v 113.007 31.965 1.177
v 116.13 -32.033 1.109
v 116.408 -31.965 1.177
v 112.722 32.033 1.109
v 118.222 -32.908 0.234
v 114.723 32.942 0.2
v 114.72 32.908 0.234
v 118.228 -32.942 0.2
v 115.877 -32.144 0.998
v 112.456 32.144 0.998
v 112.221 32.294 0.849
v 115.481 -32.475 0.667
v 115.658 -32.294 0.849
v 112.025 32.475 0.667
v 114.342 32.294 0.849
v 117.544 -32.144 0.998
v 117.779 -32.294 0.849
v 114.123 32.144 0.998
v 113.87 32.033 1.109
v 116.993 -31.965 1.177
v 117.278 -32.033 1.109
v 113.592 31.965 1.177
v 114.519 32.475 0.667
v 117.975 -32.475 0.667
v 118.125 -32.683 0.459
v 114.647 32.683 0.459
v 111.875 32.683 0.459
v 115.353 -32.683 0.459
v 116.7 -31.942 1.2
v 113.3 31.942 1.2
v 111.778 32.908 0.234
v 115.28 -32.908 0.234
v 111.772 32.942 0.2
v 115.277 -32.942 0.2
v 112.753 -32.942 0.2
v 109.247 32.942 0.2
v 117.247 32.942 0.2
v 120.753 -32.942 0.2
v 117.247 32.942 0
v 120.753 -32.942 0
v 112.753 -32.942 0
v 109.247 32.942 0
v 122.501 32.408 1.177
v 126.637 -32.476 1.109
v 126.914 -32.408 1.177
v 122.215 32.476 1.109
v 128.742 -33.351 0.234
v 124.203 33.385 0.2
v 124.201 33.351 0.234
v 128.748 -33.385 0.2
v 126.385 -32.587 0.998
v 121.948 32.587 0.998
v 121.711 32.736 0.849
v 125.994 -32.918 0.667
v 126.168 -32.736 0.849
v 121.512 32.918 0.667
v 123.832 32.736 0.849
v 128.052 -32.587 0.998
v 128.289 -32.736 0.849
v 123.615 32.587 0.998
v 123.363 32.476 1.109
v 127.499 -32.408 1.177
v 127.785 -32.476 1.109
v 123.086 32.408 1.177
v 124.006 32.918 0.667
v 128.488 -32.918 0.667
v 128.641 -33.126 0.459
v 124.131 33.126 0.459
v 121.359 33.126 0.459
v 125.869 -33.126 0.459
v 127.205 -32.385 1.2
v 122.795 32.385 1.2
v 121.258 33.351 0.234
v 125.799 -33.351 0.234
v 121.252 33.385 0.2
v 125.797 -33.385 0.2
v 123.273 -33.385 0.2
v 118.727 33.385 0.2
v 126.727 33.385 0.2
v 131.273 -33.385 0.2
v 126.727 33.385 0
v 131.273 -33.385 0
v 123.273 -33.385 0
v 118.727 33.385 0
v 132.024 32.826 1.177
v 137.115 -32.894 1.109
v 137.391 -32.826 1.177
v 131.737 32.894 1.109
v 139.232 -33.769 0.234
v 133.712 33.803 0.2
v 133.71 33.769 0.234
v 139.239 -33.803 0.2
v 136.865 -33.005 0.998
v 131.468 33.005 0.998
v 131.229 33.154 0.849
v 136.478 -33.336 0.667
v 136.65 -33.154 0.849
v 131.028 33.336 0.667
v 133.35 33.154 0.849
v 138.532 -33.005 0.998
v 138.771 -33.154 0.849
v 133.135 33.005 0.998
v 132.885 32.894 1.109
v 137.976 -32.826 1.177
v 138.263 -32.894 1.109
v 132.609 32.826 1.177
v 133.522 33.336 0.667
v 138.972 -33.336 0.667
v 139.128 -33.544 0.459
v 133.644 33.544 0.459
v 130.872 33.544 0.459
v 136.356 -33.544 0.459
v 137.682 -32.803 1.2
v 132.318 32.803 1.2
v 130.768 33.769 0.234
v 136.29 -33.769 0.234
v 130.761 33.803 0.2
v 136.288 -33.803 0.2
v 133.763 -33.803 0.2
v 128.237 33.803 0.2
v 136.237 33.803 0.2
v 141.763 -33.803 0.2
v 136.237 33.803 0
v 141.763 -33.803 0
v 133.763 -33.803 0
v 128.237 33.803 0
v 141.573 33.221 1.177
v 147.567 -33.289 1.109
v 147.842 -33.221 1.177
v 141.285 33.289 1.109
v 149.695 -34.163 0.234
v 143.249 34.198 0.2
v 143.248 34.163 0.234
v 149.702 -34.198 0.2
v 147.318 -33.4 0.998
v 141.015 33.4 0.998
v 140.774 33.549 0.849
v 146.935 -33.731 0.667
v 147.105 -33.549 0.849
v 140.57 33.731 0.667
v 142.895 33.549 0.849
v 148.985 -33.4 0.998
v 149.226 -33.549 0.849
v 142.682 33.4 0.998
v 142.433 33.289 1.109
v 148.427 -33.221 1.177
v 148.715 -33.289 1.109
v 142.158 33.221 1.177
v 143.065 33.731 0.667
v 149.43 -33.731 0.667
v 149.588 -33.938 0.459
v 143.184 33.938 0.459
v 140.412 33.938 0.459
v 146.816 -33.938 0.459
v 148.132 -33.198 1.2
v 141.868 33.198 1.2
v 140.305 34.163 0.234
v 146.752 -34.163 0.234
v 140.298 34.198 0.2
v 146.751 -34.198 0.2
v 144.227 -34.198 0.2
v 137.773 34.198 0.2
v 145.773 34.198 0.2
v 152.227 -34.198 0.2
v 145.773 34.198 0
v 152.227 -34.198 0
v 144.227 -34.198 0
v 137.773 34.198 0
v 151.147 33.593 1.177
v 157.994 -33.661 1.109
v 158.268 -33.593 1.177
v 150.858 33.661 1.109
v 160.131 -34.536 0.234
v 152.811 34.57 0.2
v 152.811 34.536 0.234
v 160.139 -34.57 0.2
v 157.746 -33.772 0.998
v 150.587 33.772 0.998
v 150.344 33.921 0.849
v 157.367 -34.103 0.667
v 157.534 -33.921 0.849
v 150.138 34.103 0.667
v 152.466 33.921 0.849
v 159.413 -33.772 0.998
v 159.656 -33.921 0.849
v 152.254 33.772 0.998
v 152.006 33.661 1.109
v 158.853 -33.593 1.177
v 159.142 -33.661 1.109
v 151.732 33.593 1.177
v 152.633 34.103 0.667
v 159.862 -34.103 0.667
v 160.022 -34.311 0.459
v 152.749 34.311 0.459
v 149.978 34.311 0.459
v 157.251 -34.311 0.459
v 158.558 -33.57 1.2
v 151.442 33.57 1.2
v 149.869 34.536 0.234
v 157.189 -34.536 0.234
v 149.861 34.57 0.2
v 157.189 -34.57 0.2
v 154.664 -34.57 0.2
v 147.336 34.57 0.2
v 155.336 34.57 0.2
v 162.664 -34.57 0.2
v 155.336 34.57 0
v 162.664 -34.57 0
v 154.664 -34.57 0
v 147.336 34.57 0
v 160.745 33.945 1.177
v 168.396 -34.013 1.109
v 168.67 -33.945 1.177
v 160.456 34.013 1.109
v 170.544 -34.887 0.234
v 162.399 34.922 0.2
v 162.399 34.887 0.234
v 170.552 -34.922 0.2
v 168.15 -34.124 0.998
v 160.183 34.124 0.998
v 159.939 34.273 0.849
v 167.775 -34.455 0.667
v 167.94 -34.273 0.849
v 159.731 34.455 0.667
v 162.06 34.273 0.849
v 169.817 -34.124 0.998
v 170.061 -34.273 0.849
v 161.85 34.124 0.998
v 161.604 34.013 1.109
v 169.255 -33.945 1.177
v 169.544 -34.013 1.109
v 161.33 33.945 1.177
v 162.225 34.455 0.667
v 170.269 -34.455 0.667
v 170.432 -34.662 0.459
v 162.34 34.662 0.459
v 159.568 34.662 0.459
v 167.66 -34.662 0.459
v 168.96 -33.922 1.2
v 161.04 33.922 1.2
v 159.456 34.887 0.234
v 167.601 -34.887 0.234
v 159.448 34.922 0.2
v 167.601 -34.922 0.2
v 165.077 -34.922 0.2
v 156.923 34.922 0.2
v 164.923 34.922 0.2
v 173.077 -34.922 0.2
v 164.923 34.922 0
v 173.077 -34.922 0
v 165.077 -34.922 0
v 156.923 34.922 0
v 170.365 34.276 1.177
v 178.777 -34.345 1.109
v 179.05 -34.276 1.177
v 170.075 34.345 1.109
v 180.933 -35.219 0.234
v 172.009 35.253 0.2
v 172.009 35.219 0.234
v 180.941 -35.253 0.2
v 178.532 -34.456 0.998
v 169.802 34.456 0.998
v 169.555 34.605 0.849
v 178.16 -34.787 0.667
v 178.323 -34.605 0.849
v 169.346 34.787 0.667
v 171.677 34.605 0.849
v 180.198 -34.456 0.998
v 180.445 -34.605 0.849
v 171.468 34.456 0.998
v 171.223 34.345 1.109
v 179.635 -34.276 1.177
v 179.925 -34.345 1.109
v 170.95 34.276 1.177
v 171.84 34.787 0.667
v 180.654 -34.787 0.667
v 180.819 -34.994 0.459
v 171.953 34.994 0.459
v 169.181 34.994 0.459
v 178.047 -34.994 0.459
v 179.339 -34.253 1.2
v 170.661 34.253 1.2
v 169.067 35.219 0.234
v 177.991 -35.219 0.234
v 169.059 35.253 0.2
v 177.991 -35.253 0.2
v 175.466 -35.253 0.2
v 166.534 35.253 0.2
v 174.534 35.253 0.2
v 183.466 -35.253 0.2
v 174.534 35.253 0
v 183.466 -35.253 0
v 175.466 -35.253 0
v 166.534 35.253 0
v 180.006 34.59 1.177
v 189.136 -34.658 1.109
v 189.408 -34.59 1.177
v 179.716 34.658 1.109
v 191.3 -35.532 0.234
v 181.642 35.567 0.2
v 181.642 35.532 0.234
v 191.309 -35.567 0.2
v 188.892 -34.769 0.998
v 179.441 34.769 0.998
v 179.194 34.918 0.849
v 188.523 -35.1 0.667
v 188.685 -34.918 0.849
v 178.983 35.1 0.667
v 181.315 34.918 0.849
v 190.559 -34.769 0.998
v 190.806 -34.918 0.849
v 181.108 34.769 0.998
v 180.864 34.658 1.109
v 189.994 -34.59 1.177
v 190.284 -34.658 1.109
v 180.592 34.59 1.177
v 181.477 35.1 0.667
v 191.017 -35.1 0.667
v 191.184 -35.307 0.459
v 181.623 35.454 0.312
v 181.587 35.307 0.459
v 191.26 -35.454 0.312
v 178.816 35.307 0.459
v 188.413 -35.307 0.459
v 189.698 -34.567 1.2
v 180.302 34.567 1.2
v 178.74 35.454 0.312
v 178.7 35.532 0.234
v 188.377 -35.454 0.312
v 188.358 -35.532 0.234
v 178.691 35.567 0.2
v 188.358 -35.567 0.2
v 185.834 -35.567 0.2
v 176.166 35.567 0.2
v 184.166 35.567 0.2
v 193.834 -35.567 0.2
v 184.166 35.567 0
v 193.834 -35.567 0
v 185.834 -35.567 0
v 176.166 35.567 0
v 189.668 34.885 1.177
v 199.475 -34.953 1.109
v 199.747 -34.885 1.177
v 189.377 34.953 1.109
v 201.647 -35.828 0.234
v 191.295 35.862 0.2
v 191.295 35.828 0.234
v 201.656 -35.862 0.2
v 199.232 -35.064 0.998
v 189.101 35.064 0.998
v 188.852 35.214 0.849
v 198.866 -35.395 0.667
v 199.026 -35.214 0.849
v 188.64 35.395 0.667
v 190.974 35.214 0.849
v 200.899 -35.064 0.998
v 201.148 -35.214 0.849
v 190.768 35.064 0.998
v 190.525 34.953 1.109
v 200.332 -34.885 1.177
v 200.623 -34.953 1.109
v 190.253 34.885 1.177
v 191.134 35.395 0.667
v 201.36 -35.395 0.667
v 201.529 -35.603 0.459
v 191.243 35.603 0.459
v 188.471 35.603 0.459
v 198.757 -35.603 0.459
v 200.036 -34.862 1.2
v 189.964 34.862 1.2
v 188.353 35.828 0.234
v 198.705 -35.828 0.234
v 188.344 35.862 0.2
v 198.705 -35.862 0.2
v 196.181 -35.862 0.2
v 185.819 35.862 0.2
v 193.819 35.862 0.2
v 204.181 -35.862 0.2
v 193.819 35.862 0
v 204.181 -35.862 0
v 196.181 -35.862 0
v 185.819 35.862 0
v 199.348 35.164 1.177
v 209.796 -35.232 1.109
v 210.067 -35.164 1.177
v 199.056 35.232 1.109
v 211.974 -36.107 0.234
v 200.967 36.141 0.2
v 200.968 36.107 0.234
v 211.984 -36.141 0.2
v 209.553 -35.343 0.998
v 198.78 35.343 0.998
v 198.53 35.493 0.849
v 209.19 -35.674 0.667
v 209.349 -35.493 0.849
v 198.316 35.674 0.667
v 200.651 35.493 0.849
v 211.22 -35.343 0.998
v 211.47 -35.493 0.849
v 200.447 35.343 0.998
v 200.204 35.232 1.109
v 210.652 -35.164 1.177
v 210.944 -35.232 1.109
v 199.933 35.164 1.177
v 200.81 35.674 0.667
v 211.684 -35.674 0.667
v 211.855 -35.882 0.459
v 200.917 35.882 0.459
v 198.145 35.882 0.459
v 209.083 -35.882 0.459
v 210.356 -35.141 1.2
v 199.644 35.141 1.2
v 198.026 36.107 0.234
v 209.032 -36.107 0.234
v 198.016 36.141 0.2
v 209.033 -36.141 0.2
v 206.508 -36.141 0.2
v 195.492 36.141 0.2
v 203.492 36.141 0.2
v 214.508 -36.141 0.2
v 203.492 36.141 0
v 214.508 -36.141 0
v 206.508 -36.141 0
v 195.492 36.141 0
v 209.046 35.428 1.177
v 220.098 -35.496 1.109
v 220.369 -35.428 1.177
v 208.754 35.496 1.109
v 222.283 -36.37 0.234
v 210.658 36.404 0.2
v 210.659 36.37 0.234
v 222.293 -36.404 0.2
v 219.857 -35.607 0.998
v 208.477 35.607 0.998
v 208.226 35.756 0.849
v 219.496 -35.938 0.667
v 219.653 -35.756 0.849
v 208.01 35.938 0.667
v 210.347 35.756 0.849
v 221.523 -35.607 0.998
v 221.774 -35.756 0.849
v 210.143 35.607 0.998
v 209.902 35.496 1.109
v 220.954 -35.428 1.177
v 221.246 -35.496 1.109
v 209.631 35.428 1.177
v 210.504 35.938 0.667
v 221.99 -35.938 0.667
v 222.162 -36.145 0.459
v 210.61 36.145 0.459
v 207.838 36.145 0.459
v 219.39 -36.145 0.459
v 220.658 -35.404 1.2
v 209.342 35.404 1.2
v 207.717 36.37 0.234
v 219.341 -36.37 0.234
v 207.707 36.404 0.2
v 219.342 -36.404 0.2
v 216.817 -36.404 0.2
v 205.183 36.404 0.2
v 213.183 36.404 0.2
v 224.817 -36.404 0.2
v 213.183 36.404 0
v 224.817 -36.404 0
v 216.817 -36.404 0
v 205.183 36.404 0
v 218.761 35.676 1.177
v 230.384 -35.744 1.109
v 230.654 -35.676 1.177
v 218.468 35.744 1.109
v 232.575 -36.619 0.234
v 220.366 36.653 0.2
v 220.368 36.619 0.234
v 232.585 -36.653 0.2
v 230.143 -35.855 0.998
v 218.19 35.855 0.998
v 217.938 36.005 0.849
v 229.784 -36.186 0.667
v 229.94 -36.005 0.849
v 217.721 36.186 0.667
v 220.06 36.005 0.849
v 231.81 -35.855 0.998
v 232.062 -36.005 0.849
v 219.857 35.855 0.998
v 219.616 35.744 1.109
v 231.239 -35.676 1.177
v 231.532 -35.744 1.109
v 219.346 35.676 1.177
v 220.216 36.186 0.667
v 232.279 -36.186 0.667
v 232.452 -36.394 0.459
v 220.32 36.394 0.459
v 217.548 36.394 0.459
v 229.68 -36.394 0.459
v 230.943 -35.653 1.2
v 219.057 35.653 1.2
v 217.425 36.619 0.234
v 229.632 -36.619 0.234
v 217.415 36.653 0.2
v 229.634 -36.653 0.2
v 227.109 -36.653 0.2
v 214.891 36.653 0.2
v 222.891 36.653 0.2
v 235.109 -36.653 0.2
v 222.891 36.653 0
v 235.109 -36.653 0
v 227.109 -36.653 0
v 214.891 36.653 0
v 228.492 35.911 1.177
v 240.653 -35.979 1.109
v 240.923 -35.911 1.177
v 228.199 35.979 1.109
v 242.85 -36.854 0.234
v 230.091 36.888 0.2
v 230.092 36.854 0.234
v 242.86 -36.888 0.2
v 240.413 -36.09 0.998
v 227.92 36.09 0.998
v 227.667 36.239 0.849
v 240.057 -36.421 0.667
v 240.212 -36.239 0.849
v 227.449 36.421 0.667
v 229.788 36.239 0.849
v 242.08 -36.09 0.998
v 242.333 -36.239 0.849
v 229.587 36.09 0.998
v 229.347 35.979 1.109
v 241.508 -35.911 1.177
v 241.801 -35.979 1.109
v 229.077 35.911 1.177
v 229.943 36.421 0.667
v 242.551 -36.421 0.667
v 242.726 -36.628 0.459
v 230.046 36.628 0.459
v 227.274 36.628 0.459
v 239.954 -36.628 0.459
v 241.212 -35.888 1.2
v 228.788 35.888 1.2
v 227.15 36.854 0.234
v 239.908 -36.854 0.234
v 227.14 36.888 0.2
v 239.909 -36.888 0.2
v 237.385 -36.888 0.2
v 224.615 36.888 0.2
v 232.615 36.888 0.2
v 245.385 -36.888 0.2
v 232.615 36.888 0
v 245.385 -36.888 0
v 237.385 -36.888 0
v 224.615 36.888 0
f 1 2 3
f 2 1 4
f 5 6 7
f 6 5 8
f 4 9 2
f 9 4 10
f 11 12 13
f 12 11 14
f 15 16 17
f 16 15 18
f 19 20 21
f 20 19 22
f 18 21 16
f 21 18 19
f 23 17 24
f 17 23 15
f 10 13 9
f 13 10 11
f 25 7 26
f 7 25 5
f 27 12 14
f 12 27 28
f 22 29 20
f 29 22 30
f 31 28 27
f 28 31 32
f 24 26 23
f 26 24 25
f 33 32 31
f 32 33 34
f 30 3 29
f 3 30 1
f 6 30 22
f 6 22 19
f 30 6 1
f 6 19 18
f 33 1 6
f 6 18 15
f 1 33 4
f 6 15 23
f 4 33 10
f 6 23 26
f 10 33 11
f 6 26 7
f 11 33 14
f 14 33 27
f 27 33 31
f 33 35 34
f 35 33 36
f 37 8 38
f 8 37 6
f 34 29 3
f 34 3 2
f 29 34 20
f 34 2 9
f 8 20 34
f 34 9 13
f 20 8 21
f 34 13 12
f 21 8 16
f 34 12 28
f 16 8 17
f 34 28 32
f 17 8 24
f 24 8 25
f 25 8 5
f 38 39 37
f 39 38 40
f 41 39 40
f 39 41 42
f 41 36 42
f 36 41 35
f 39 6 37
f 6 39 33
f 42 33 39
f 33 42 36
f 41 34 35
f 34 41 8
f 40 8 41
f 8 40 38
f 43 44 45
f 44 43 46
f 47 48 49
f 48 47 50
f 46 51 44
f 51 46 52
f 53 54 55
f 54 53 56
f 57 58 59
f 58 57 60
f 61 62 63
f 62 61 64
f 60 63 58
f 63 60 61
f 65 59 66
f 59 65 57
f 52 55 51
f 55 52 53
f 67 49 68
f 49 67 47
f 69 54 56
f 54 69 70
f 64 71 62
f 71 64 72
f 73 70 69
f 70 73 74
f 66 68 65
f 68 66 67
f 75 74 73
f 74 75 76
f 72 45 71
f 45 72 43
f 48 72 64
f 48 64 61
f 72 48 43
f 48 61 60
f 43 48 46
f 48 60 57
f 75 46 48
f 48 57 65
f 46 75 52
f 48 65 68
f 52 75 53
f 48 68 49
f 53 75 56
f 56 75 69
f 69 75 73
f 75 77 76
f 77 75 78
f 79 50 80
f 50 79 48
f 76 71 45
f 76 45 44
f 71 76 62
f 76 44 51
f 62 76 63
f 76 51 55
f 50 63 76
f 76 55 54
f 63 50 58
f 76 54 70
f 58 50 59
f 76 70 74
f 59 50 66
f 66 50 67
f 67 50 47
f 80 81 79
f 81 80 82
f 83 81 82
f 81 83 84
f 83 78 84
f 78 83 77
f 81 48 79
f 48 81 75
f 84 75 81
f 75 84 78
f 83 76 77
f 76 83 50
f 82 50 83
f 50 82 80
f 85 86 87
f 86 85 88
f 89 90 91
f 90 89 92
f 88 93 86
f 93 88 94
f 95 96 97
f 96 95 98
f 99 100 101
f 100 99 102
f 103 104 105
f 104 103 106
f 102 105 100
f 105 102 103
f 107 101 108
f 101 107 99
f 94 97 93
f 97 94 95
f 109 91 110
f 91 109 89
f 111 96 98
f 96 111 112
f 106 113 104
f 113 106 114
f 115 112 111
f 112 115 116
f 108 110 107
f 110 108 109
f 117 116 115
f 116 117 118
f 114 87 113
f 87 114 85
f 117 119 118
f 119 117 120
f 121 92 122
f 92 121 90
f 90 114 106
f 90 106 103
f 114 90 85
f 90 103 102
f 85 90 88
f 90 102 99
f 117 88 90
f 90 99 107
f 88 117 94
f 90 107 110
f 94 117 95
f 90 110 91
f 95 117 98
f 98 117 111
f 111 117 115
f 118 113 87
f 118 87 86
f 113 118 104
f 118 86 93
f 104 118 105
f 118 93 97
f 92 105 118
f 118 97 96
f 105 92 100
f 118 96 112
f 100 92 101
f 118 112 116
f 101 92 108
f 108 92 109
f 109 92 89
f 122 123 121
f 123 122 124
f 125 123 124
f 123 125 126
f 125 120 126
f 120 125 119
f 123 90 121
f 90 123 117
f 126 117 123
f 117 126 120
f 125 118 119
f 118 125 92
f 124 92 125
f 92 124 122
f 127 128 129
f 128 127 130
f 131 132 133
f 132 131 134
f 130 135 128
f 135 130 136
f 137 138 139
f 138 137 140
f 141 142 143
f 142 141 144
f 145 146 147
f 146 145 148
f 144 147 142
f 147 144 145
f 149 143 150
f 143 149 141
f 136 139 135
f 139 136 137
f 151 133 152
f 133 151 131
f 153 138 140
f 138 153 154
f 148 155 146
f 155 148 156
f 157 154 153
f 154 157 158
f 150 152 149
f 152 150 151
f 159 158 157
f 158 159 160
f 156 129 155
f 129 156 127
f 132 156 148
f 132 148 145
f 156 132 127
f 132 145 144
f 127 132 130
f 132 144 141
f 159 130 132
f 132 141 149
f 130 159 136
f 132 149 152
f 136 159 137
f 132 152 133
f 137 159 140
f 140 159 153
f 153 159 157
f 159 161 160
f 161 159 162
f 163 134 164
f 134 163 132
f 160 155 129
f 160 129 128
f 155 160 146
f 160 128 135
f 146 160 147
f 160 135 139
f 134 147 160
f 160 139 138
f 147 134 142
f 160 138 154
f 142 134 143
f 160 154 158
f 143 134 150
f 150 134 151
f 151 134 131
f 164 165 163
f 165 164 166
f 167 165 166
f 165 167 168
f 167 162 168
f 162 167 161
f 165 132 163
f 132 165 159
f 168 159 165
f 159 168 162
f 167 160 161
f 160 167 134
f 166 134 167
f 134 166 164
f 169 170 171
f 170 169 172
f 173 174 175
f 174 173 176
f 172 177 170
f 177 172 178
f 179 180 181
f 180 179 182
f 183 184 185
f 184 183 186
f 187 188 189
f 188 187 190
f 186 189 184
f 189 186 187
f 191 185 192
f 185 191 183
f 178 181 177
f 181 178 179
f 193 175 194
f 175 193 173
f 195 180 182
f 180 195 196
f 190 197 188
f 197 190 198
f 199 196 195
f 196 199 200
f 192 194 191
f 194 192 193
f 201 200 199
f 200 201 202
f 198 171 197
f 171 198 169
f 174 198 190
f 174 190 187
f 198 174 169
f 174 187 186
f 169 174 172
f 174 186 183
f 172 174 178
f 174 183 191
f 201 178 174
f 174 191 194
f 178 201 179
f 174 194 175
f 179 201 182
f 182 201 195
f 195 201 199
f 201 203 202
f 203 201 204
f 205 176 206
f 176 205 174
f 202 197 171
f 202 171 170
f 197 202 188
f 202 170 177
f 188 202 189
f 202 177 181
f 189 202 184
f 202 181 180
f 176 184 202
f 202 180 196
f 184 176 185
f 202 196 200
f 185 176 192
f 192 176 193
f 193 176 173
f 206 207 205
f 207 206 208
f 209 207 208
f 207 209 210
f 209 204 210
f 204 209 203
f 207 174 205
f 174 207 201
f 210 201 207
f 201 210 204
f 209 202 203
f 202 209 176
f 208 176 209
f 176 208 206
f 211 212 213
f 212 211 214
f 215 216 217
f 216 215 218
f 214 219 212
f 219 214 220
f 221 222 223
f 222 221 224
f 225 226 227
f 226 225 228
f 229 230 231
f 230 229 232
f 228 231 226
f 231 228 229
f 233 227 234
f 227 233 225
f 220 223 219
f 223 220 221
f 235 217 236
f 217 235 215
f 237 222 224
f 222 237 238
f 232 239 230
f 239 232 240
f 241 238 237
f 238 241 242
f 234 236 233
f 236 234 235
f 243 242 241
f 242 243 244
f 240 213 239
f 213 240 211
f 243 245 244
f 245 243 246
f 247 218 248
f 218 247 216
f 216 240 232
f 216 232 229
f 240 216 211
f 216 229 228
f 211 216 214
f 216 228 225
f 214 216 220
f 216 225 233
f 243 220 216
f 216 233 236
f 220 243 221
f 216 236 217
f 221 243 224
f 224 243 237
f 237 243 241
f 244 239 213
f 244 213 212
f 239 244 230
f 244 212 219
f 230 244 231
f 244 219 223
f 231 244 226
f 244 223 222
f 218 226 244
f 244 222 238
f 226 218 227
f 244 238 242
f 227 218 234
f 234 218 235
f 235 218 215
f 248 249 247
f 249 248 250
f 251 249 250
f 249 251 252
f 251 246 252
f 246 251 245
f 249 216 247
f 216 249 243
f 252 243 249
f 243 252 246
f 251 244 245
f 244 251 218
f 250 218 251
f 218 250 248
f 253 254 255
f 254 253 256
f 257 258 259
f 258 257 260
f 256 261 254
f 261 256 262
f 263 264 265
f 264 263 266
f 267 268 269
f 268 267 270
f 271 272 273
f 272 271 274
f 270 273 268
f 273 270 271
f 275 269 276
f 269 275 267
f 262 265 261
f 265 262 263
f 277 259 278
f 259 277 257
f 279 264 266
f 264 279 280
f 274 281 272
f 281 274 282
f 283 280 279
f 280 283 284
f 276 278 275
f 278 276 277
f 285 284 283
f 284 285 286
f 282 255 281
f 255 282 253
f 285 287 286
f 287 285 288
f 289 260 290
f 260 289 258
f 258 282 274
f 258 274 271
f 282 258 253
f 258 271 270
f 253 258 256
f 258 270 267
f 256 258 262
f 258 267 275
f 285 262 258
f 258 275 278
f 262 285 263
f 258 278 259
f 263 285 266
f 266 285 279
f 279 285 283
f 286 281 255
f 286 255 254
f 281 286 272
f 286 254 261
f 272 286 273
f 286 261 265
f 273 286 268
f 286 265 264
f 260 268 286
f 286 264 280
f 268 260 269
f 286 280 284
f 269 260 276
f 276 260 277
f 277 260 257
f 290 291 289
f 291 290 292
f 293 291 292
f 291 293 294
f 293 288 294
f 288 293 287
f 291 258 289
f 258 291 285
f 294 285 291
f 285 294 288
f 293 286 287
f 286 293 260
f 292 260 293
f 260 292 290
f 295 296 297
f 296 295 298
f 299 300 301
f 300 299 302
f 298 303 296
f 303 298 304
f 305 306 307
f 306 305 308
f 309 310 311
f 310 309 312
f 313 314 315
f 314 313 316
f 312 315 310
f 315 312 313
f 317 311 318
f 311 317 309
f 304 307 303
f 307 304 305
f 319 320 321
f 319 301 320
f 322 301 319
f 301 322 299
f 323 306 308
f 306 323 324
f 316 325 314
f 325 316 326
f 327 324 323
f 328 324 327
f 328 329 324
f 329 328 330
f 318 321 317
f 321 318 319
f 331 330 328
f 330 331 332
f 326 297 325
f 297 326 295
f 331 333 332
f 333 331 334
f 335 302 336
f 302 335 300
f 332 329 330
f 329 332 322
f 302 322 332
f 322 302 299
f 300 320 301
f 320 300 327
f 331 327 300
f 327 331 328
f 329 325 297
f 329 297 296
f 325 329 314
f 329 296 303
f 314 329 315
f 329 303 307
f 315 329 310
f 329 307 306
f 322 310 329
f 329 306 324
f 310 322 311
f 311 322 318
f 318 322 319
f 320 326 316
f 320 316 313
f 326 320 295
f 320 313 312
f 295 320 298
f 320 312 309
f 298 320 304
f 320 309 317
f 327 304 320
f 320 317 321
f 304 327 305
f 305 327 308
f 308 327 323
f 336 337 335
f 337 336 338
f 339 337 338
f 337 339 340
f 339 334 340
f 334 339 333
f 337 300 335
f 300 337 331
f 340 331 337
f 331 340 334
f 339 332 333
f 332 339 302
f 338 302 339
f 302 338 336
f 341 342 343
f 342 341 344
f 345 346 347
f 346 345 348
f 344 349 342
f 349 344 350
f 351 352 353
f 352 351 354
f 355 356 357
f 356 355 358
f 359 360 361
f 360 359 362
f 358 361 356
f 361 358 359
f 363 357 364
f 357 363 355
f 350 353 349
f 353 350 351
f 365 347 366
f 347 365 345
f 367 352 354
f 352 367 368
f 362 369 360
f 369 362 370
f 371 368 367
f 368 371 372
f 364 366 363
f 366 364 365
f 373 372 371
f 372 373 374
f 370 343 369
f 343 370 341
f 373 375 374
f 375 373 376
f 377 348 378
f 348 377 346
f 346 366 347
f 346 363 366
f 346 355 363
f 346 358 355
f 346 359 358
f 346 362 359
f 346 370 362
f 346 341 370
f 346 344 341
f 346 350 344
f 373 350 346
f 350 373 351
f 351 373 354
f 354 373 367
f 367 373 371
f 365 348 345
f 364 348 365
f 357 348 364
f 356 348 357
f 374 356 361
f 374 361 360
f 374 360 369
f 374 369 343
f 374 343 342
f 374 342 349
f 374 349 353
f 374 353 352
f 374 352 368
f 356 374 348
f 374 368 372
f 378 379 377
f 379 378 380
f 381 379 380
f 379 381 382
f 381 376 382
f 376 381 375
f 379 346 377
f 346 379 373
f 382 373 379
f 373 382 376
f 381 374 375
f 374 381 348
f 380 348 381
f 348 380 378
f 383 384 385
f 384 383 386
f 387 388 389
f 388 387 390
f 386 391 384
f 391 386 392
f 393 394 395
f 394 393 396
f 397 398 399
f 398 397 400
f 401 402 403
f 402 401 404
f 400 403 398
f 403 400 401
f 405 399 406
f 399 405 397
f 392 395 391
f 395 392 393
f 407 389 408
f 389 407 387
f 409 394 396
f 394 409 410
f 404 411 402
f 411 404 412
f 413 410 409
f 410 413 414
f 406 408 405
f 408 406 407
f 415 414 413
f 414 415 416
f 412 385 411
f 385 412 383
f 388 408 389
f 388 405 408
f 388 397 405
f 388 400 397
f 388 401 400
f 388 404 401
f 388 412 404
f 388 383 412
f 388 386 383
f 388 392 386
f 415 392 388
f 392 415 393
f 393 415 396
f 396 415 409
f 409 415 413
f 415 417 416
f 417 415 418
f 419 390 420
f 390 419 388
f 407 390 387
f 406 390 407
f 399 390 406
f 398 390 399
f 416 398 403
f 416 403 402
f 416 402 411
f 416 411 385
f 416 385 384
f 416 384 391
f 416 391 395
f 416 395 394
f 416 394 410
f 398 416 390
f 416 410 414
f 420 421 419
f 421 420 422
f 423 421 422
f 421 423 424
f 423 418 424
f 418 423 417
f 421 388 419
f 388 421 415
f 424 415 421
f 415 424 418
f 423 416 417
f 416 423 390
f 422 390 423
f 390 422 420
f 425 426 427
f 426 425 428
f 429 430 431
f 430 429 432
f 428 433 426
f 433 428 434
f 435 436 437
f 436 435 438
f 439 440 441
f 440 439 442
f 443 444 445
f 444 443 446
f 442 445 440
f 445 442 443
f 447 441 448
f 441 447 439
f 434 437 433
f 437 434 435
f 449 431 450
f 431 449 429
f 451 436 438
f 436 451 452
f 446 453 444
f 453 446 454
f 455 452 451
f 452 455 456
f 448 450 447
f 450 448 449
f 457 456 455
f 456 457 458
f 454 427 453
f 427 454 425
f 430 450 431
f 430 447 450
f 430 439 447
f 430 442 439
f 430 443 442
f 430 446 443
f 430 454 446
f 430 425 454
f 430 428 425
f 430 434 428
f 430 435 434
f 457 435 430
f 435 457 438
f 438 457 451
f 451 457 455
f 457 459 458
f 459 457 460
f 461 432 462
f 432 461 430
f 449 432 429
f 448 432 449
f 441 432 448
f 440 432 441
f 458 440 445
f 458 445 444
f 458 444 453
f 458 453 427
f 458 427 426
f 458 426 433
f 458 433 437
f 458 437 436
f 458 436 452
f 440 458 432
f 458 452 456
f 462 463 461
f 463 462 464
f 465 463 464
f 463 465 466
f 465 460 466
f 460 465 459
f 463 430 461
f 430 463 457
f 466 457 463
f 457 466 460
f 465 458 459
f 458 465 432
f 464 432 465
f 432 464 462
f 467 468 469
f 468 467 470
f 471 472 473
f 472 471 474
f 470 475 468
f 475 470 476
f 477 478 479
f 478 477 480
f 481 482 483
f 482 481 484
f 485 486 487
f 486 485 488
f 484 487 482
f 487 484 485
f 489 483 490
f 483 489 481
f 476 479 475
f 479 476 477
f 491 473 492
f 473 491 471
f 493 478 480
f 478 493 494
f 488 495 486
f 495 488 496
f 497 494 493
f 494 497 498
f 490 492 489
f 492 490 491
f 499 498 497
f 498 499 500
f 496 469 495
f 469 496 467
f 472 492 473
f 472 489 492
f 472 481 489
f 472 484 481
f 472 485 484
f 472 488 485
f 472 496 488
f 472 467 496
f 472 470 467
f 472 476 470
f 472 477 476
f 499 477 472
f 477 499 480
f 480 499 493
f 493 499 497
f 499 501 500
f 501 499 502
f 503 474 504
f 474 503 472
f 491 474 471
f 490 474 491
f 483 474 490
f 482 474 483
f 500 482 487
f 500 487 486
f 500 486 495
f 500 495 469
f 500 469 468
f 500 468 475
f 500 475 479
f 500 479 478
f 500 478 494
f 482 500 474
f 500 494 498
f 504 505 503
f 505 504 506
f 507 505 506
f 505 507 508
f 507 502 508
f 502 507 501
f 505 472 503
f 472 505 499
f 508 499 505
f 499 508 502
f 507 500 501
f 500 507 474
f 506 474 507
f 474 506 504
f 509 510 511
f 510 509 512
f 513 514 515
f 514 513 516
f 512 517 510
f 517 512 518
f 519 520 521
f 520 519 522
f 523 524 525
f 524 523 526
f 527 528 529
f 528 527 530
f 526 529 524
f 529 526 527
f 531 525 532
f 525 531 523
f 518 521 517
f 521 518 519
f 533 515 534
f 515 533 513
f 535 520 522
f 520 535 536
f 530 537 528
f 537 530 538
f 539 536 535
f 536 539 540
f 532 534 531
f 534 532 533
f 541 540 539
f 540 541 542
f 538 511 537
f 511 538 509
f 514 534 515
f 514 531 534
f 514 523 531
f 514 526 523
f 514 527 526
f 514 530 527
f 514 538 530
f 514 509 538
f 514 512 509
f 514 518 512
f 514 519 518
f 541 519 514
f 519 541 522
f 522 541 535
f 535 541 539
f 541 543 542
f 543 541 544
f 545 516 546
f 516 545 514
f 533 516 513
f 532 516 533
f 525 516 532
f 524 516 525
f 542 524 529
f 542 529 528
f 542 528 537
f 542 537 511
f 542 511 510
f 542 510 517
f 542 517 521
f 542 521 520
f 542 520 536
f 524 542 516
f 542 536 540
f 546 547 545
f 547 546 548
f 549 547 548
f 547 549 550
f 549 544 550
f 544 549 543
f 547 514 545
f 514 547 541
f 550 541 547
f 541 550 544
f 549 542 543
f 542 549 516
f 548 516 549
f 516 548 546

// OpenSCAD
$fs=1/2;
$fa=1/2;
$fn=32;

base_thickness=0.2;
base_width=8;

fret_length=55;
fret_height=1.2;
fret_width=3;

neutral_fret=8.5;
scale_bass=342*2;
scale_treble=324*2;
width_0=51;
width_24=74;
scale=(scale_treble+scale_bass)/2;
//frets=[for (i=[0.5:1:10.5]) i];
frets=[for (i=[11.5:1:23.5]) i];

function fret_coord(n)=scale*(1-pow(0.5,n/12));
function fret_length(coord)=lookup(coord,[[fret_coord(0),width_0],[fret_coord(24),width_24]]);

total_skew=(scale_bass-scale_treble)/2;
offset=total_skew*fret_coord(neutral_fret)/scale;

function skew(fret_coord)=total_skew*fret_coord/scale-offset;

for (fret=frets) translate([fret*(base_width+2),0,0]) fret(fret_length(fret_coord(fret)),skew(fret_coord(fret)));

module fret(length=fret_length,skew) multmatrix([[1,-2*skew/length,0,0],
                                                 [0,1,0,0],
                                                 [0,0,1,0],
                                                 [0,0,0,1]]){
  echo(length);
  intersection() {
    rotate([90,0,0]) linear_extrude(length, center=true) {
      scale([fret_width,fret_height*2])
      intersection() {
        circle(r=0.5);
        translate([-0.5,0]) square([1,0.5]);
      }
    }
    translate([0,0,base_thickness])linear_extrude(height=fret_height,scale=[1,(length-2*fret_height)/length]) square([base_width,length],center=true);
  }
  translate([-base_width/2,-length/2,0])cube([base_width,length,base_thickness]);
}
